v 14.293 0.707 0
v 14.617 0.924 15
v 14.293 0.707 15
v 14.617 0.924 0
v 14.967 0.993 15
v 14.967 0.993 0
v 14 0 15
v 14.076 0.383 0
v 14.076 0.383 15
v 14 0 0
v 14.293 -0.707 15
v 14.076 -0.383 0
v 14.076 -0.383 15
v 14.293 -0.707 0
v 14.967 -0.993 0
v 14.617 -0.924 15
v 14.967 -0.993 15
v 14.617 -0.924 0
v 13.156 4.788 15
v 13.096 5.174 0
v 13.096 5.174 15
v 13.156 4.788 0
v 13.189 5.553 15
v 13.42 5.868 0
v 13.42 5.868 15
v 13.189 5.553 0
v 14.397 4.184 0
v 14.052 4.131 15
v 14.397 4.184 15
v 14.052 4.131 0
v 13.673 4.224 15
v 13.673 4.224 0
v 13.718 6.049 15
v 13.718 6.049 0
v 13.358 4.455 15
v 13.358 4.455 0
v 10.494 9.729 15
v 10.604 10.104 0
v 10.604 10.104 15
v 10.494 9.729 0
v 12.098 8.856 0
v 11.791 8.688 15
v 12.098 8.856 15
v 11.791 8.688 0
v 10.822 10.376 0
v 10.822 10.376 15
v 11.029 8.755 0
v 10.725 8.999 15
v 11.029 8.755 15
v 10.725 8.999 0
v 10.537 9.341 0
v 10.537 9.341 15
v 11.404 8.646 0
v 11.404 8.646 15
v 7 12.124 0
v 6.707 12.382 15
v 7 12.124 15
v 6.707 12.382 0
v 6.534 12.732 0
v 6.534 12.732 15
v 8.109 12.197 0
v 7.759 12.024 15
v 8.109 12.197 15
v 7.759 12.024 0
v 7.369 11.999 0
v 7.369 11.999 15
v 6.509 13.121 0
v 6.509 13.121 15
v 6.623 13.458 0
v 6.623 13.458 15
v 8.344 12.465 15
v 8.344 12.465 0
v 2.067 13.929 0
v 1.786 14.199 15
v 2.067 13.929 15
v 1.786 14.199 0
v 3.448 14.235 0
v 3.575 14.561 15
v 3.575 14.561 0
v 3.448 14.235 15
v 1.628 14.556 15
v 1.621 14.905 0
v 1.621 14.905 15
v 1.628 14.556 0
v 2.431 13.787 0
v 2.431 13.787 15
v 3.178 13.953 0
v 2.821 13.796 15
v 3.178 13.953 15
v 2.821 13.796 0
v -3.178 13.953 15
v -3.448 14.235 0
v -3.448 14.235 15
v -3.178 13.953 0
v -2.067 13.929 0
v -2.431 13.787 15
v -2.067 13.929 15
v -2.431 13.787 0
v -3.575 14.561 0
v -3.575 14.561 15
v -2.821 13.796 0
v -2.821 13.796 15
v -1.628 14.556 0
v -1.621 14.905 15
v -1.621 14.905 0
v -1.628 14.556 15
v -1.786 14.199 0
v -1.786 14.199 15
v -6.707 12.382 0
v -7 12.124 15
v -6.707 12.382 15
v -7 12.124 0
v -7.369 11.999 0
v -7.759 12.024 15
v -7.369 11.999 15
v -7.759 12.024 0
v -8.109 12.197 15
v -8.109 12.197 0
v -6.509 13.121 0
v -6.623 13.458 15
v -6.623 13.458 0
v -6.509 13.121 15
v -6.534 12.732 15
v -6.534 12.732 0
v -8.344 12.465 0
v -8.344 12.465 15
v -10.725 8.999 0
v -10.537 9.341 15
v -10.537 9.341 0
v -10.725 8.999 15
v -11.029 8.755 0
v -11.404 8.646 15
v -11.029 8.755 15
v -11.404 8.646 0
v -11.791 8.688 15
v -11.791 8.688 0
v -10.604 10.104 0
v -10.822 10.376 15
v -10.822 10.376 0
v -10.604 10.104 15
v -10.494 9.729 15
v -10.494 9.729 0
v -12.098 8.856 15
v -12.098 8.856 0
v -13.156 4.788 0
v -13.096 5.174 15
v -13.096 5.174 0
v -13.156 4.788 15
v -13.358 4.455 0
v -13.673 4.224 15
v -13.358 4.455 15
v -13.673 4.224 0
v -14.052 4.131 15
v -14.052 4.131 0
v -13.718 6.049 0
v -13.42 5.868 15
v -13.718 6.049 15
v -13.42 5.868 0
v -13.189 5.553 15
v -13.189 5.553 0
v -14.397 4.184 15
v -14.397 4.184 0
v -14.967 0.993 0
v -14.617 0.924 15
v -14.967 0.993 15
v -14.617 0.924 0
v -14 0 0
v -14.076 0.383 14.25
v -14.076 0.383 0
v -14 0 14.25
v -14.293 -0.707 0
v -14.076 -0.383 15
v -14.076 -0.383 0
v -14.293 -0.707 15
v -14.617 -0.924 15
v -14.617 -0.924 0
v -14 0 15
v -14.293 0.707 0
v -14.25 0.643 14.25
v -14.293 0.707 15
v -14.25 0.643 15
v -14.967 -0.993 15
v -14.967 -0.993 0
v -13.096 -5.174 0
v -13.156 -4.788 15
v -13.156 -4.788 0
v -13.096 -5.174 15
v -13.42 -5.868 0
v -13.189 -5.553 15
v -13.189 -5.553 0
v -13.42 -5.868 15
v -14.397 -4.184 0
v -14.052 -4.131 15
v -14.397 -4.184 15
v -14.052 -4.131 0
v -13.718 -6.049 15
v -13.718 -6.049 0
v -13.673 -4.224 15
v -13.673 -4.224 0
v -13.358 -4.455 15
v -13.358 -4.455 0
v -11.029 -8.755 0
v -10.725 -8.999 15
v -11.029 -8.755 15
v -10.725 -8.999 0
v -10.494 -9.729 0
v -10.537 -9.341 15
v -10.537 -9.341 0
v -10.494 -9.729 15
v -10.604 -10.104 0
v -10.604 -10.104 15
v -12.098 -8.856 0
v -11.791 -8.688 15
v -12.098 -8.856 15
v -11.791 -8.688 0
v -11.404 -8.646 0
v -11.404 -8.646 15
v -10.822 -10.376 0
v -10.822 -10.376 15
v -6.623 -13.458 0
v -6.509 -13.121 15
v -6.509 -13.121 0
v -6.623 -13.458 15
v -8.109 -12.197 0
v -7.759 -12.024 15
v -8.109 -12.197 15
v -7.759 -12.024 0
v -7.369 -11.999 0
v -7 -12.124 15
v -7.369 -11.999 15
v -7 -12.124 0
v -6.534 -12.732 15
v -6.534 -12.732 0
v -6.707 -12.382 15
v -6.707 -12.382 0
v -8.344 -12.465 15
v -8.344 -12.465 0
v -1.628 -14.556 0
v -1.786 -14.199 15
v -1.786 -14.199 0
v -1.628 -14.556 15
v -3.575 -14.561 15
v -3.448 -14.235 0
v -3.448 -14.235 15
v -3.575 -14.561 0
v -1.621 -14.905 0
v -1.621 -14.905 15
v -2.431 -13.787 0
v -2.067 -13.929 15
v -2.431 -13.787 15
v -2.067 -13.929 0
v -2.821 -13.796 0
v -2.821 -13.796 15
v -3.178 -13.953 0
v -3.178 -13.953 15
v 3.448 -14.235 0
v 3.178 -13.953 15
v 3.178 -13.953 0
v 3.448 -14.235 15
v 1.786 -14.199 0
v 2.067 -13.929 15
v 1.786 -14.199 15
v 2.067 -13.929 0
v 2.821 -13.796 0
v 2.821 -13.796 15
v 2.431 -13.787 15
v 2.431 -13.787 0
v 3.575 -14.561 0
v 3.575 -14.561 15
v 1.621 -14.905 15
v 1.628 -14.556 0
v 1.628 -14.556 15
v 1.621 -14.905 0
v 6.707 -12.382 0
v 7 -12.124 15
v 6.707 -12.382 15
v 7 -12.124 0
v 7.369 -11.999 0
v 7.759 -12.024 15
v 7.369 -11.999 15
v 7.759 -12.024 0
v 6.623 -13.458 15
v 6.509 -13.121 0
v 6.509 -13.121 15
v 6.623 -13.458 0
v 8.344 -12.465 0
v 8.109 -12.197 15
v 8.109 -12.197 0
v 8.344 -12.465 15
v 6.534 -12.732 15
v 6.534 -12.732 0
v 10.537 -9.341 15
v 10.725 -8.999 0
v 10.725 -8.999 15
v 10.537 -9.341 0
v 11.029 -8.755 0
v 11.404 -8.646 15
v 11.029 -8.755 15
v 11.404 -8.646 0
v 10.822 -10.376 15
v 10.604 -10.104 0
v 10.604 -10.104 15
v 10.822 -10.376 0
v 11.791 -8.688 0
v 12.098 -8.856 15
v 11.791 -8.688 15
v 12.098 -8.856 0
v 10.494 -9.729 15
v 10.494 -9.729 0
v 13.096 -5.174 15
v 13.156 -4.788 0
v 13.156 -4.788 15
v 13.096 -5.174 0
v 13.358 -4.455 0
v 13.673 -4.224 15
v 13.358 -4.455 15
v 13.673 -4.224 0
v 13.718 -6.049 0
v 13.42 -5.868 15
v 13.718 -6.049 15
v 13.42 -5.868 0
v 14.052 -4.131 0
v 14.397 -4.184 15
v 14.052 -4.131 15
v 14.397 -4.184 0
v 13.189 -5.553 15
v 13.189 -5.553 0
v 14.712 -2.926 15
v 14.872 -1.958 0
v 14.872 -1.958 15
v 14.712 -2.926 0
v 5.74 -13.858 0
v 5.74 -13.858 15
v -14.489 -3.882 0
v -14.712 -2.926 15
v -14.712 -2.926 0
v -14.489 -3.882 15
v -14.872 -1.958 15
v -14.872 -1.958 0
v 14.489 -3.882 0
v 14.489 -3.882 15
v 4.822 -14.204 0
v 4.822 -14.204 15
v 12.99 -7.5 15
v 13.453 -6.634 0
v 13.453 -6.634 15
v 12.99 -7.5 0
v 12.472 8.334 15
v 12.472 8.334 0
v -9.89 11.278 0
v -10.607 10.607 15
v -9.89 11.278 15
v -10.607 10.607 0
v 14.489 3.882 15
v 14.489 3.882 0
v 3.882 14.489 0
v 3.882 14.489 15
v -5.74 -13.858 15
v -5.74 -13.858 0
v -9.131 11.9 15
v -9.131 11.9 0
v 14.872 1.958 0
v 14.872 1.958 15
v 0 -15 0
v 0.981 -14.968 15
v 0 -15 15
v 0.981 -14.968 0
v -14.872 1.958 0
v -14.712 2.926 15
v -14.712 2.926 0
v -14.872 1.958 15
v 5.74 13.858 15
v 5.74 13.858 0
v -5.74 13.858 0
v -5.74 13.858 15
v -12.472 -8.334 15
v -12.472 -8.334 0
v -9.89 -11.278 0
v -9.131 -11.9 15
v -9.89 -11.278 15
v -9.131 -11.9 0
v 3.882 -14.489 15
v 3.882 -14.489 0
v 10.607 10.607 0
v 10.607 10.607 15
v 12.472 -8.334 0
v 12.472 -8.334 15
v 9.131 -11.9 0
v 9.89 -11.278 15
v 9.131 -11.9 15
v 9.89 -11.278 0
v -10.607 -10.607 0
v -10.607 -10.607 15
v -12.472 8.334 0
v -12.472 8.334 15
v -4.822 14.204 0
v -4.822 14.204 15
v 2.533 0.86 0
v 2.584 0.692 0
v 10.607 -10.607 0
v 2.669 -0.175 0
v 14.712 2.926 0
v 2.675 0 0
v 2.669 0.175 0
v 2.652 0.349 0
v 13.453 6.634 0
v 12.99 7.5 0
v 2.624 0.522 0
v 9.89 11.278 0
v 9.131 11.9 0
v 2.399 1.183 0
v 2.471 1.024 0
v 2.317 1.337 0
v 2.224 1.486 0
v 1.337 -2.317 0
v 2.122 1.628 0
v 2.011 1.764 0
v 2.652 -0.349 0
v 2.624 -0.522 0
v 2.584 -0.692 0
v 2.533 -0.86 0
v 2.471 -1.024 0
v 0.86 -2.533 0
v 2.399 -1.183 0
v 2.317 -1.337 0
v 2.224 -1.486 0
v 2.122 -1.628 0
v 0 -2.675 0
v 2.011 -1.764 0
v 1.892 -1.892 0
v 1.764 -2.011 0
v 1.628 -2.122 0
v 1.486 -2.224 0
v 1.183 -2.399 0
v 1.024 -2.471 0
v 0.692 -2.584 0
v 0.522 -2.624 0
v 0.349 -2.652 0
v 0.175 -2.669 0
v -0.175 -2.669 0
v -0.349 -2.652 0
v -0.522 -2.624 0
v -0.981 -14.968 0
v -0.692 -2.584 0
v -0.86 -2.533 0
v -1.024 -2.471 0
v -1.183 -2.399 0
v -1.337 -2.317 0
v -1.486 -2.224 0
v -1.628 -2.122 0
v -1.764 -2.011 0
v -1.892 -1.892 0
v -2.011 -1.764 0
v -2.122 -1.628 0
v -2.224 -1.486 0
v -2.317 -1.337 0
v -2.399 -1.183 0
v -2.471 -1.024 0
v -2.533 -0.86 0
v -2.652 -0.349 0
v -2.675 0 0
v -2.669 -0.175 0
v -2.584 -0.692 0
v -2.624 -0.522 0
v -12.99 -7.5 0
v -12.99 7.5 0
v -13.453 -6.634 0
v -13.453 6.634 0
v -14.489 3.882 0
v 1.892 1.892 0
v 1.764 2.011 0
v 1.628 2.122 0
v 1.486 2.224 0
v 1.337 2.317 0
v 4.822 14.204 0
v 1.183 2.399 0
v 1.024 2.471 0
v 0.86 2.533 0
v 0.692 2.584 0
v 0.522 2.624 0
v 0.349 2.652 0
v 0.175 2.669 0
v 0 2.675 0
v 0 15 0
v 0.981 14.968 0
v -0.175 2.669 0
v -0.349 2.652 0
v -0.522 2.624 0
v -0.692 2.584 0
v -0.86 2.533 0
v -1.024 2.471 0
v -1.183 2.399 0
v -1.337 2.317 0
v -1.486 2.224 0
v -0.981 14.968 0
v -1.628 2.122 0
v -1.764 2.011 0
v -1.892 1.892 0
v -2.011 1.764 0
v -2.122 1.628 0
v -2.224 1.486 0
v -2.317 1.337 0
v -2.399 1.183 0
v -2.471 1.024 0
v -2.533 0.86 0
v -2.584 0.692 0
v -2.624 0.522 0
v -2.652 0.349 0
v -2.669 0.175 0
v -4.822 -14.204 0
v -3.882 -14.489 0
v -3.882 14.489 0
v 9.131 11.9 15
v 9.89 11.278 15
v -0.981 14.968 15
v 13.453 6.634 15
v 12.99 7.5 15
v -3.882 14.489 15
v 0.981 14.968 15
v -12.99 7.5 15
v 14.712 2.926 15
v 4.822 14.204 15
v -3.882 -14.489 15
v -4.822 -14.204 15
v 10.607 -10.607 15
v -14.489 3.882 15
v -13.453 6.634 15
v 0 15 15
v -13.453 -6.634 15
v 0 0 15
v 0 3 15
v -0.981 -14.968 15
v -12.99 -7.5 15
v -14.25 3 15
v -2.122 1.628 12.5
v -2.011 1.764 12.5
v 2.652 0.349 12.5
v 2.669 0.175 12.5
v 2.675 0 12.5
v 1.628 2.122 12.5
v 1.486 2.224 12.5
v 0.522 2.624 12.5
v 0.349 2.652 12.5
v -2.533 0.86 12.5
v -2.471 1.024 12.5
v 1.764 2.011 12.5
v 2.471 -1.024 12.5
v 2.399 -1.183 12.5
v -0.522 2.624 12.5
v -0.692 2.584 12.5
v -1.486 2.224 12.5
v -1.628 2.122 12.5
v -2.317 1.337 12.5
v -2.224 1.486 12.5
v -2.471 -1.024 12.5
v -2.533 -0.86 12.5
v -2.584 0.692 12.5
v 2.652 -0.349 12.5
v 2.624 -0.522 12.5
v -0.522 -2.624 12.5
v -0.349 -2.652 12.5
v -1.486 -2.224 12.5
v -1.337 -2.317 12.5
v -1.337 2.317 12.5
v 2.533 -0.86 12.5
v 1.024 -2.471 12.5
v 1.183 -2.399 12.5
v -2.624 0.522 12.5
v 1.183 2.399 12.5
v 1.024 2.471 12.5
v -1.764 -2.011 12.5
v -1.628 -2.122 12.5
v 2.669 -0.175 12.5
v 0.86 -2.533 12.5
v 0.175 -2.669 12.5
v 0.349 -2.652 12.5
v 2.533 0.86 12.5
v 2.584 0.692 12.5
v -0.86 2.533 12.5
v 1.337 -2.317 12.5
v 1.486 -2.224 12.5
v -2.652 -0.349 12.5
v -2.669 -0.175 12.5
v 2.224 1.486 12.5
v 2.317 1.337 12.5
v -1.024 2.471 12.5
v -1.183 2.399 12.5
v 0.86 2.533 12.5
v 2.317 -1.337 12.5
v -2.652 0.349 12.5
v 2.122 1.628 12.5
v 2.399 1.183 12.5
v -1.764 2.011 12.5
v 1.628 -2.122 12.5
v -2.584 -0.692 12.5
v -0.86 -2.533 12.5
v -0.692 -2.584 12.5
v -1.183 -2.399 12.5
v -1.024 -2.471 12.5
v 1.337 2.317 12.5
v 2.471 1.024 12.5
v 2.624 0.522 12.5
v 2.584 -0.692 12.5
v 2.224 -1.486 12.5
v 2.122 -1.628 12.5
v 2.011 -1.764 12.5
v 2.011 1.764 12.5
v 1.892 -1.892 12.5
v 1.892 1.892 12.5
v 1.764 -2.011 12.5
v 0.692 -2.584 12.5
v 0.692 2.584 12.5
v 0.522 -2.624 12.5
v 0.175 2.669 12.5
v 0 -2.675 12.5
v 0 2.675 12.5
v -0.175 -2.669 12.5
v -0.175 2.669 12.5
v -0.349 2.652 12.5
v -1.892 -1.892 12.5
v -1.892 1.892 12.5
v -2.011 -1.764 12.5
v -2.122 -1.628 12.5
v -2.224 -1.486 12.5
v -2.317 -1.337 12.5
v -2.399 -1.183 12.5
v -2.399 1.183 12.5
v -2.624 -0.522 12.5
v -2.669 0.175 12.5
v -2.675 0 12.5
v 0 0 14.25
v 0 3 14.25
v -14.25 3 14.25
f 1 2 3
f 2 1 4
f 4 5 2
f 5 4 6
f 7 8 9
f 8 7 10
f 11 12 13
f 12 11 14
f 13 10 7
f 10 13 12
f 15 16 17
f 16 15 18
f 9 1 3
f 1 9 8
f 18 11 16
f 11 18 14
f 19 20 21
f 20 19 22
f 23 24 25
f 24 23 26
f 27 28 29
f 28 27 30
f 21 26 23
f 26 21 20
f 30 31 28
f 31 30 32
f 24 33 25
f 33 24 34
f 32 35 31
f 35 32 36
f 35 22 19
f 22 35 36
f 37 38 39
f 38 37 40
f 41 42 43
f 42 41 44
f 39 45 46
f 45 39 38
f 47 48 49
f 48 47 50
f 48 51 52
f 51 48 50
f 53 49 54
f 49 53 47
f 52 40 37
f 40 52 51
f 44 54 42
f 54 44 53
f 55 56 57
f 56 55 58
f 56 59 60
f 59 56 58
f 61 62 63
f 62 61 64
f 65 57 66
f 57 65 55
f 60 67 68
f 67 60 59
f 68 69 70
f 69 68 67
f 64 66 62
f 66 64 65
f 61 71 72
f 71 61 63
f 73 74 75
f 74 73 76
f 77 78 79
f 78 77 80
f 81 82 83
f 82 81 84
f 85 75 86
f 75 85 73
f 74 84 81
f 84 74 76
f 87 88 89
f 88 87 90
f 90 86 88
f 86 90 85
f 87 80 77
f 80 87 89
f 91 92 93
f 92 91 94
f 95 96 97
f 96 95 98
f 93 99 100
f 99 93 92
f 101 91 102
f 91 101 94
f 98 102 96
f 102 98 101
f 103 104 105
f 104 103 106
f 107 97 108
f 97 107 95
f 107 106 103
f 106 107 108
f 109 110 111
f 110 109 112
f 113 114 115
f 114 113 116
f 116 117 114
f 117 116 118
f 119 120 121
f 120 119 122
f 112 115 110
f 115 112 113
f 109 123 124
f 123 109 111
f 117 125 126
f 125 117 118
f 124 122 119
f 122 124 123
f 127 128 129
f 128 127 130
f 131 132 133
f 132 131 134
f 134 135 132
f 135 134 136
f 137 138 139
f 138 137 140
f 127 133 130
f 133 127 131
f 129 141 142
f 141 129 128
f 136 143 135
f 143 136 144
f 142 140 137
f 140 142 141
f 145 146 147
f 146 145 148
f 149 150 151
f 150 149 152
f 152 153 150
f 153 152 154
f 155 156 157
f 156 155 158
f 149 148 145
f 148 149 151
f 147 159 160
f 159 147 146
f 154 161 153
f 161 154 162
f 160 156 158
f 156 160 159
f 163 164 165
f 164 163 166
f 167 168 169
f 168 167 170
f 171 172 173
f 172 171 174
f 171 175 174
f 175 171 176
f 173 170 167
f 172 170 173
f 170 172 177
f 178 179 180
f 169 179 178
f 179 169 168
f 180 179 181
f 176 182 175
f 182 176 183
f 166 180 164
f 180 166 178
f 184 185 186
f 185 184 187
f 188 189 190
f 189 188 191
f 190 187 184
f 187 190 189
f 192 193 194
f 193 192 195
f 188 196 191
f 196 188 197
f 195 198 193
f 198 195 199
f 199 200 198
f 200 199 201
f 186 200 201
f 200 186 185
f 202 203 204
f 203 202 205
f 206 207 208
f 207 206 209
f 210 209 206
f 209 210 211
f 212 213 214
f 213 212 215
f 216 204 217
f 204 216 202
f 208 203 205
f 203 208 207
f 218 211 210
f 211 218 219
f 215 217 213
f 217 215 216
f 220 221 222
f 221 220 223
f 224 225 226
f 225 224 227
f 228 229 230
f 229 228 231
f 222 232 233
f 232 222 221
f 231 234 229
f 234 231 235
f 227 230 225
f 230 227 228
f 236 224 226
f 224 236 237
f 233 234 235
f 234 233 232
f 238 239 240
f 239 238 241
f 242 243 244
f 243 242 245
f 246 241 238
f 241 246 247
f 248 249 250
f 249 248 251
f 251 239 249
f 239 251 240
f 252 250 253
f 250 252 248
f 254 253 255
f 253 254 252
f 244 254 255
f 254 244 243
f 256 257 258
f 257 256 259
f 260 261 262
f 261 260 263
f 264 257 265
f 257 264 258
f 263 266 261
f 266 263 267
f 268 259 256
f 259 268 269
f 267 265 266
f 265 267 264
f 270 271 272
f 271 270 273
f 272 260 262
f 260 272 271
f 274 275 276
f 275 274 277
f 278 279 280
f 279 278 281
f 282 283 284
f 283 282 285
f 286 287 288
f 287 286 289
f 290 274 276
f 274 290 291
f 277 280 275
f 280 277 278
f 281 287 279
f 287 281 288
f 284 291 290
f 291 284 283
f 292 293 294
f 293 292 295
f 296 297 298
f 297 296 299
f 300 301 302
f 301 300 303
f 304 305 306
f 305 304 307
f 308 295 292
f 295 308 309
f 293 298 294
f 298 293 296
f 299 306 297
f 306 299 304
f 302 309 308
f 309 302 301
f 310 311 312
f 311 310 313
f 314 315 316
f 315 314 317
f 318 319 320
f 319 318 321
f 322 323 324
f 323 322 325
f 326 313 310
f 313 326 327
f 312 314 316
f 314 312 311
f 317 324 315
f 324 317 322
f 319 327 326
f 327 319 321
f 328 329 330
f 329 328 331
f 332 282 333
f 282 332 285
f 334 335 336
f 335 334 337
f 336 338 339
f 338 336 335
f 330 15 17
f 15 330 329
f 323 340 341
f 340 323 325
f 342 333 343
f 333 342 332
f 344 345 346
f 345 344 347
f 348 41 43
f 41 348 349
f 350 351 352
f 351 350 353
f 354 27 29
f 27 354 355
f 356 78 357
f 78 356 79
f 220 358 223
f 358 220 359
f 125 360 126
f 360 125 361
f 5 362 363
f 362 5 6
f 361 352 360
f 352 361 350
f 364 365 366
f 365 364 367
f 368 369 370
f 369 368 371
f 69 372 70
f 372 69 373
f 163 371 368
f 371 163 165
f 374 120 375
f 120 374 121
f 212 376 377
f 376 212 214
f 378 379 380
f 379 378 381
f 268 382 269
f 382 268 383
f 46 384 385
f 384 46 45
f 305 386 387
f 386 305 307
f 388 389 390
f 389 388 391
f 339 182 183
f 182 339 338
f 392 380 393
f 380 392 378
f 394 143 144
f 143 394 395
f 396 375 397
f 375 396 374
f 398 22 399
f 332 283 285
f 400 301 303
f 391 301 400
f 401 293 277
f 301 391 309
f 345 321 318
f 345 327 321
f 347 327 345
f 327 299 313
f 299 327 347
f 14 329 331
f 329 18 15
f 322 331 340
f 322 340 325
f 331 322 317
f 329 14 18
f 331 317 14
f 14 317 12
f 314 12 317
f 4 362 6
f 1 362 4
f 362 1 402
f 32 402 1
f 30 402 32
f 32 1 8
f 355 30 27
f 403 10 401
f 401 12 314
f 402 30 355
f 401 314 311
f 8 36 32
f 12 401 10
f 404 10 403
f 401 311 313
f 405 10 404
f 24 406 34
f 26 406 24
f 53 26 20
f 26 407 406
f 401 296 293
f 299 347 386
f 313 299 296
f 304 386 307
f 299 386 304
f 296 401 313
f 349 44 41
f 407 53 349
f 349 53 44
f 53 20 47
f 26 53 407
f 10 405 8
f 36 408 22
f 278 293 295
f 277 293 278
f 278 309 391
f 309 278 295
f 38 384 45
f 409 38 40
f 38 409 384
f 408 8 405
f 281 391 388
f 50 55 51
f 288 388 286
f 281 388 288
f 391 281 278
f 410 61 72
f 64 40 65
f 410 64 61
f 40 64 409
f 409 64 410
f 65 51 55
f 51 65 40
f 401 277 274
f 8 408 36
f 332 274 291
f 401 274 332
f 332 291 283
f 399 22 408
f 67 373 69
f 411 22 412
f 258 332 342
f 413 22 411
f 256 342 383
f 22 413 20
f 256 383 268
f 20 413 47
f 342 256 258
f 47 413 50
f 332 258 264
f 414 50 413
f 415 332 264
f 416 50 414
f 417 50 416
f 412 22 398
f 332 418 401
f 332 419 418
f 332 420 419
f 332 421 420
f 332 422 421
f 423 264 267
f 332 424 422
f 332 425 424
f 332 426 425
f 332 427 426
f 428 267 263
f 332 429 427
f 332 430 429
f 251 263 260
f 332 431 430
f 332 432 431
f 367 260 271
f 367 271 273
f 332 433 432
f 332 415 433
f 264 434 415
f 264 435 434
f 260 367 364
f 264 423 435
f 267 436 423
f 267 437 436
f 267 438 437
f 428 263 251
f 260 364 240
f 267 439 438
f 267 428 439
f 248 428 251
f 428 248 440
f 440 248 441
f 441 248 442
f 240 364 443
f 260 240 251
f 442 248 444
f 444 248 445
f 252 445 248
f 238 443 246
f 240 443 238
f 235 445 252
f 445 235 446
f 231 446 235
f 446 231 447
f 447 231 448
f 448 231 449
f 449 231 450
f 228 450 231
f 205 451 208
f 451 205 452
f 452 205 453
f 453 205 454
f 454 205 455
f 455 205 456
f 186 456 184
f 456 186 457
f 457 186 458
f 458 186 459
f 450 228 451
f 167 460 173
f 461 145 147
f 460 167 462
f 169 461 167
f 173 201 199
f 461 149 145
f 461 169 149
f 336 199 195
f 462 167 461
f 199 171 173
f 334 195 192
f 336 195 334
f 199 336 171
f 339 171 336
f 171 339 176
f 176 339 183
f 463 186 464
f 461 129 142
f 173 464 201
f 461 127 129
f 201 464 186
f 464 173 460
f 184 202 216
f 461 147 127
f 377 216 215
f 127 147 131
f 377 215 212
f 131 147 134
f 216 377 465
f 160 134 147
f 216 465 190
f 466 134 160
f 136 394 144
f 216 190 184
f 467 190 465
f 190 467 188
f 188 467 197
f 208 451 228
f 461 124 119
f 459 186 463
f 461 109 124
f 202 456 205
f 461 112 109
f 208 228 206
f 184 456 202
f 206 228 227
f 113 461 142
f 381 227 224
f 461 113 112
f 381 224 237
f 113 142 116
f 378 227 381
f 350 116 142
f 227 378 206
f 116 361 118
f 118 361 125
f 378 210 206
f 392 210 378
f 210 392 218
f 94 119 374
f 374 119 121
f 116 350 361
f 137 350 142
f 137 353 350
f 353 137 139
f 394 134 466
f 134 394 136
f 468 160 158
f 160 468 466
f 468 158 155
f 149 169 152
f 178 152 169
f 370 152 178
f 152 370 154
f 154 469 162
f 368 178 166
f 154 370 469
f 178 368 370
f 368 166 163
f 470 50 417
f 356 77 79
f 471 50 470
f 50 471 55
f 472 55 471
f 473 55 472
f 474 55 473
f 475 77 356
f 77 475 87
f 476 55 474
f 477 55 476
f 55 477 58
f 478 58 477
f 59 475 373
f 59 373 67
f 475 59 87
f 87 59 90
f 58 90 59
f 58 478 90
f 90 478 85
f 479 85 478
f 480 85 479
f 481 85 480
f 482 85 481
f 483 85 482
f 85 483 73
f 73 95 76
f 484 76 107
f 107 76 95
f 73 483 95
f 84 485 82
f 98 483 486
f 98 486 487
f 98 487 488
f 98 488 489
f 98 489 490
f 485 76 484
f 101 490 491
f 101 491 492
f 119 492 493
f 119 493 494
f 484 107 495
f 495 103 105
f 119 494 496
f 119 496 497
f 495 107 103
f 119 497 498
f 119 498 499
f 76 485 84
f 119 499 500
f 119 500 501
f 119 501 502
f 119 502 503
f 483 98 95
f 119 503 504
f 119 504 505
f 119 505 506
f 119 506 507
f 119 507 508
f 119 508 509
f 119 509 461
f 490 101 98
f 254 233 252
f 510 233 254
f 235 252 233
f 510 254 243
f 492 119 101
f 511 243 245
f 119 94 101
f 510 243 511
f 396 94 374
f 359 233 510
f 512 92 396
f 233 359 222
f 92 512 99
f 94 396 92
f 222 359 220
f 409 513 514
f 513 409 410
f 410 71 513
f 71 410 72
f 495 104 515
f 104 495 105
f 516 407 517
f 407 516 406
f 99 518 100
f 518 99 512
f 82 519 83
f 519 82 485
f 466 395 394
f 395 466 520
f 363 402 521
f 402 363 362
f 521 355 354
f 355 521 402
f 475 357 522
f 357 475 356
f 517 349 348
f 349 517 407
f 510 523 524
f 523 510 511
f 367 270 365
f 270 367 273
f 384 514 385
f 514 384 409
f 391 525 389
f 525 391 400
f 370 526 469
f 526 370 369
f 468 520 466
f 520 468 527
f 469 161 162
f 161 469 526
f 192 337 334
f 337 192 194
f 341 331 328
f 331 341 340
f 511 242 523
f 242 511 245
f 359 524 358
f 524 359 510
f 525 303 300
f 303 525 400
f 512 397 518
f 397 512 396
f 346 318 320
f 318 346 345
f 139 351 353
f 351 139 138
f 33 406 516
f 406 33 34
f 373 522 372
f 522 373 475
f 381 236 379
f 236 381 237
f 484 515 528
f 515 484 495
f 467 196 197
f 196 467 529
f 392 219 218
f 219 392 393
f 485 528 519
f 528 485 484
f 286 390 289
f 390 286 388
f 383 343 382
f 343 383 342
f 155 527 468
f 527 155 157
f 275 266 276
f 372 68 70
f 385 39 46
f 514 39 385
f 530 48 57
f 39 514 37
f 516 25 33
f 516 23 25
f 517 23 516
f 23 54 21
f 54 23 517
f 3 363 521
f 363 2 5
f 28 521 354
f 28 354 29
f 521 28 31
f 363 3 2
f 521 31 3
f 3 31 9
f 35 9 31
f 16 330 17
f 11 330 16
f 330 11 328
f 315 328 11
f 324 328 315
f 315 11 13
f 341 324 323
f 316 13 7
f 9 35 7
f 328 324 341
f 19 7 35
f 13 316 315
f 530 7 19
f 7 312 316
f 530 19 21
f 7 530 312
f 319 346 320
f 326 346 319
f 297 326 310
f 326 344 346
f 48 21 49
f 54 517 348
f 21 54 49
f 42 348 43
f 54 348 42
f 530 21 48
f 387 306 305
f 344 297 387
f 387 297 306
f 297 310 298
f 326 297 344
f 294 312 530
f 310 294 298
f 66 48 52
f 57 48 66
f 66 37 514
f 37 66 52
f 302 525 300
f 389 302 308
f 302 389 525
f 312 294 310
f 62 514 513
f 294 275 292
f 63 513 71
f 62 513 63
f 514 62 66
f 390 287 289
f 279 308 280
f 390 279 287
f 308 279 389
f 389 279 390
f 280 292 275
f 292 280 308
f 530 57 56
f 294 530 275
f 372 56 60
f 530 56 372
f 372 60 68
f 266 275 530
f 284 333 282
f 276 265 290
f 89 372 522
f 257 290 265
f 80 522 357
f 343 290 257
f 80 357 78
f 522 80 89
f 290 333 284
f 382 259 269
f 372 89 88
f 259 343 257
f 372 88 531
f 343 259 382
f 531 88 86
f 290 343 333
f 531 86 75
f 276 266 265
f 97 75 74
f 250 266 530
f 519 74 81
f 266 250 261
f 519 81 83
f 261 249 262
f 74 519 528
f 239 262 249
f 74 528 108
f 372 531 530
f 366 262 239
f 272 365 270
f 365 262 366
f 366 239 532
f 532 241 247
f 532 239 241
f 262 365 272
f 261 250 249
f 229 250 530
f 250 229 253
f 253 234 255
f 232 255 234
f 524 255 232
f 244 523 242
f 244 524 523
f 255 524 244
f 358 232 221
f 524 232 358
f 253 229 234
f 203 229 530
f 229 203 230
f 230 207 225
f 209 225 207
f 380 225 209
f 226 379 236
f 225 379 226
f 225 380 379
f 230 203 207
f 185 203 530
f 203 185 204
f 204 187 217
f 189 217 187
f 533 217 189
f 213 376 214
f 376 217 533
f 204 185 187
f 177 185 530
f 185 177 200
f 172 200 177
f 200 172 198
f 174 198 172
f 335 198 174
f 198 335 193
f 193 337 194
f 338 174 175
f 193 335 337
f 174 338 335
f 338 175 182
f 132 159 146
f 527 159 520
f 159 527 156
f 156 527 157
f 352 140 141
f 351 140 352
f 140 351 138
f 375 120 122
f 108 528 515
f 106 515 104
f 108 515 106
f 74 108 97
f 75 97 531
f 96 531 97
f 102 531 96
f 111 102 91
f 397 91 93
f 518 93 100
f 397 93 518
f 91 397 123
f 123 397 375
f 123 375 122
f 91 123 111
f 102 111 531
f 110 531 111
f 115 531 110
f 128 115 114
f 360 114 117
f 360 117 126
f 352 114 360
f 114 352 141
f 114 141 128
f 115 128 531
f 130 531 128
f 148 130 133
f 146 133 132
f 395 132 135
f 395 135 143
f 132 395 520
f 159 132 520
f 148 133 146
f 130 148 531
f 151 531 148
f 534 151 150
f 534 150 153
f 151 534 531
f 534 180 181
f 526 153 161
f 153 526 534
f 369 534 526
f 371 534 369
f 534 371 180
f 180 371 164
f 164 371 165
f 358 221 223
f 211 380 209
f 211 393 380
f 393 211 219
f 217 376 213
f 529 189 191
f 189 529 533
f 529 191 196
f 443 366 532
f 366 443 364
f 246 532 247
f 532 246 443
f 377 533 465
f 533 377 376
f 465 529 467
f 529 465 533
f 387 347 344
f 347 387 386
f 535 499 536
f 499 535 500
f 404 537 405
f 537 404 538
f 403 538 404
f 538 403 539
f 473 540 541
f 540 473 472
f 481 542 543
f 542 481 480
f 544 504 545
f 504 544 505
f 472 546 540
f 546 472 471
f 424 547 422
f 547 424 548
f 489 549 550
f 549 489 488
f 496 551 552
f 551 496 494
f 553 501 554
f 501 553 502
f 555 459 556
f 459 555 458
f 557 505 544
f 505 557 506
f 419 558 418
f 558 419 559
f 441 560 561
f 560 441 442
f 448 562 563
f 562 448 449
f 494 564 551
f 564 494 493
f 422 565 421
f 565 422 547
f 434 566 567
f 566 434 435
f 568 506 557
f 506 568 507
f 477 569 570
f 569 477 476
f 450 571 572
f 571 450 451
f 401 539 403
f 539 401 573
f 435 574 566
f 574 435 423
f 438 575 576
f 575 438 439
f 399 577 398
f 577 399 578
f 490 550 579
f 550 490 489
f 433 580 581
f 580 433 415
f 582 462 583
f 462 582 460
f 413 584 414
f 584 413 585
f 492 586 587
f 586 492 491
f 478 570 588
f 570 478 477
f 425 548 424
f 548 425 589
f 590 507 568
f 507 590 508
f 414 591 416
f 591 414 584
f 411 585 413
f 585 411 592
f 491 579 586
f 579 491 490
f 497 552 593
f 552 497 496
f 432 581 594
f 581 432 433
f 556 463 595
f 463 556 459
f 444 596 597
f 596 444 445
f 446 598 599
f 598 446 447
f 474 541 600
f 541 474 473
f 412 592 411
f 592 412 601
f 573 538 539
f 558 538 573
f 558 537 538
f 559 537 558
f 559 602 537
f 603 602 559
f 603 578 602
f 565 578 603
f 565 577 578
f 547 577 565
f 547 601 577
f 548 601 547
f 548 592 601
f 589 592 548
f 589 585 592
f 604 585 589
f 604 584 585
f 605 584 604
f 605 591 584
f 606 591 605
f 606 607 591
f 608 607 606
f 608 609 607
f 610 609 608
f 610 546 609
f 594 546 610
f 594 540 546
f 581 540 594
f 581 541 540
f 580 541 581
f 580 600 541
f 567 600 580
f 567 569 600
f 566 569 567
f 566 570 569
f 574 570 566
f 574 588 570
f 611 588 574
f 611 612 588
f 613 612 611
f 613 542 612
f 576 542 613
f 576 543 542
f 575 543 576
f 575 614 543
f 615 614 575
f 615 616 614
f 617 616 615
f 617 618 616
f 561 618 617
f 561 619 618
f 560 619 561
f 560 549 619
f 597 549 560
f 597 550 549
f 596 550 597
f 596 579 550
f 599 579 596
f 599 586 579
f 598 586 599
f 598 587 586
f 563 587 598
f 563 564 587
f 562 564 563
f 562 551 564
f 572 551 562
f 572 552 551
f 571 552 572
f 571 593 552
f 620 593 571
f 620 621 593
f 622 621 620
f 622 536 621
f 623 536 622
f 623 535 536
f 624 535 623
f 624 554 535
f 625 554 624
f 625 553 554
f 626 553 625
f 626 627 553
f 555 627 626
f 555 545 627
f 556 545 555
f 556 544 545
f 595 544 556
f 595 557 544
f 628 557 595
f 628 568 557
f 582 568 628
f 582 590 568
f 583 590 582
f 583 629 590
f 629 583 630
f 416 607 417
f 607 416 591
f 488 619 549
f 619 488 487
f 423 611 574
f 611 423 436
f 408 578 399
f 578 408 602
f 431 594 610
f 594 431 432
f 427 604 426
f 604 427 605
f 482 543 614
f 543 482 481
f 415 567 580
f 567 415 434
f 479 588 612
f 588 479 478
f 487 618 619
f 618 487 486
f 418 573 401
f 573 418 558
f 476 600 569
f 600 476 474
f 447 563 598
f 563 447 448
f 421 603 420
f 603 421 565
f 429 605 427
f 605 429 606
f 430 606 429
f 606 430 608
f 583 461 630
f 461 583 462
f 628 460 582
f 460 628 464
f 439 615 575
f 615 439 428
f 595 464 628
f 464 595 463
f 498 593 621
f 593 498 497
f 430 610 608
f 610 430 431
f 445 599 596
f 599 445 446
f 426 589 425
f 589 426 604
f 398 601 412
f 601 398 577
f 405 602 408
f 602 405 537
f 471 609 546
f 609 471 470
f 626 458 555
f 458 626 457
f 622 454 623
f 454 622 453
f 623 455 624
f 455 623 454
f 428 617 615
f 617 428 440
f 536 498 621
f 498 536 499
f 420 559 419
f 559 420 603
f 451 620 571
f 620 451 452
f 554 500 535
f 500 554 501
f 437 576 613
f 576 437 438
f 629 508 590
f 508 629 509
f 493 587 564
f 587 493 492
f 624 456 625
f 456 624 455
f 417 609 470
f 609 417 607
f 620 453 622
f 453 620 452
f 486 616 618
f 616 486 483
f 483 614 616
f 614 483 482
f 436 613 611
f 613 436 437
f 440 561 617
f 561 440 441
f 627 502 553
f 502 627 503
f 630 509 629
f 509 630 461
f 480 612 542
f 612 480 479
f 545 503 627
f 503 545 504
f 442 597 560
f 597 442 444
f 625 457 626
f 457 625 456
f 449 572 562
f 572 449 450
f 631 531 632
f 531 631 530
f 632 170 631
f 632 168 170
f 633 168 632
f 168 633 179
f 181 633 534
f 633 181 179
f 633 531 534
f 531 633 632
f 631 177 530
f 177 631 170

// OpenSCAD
// Replacement knob for a hotplate stirrer with a 6 mm D-shaft
// Print orientation: bottom face (with D-bore) on the bed at z = 0

// ---------------- Parameters ----------------
knob_d        = 30;    // knob outer diameter
knob_h        = 15;    // knob height
shaft_d       = 6;     // D-shaft diameter (for reference)

bore_depth    = 12;    // D-bore depth from bottom face
bore_w        = 4.7;   // D-bore width (flat to opposite side of circle)
bore_r        = bore_w / 2 + (shaft_d - bore_w) / 4; // radius of the 6.2 mm circle, adjusted for the flat

groove_count  = 18;    // number of vertical grip grooves
groove_d      = 2;     // groove diameter (half-cylinder)
groove_h      = knob_h; // groove full height

pointer_w     = 1.5;   // pointer groove width
pointer_d     = pointer_w / 2; // pointer groove depth (1 mm)

eps           = 0.5;   // overcut so cutting faces are not coplanar
$fn           = 96;    // curve resolution

// ---------------- Model ----------------
difference() {
    // Main body
    cylinder(d = knob_d, h = knob_h);

    // D-shaped blind bore from bottom face
    translate([0, 0, -eps])
        cylinder(r = bore_r, h = bore_depth + 2 * eps);

    // Vertical grip grooves around the outside
    for (i = [0 : groove_count - 1])
        rotate([0, 0, i * 360 / groove_count])
            translate([knob_d / 2, 0, -eps])
                cylinder(d = groove_d, h = groove_h + 2 * eps, $fn = 16);

    // Pointer groove on top face, on the same side as the flat of the D
    translate([-(knob_d / 2 - pointer_d), 0, knob_h - pointer_d])
        cube([knob_d / 2 - pointer_d, pointer_w * 2, pointer_d]);
}
